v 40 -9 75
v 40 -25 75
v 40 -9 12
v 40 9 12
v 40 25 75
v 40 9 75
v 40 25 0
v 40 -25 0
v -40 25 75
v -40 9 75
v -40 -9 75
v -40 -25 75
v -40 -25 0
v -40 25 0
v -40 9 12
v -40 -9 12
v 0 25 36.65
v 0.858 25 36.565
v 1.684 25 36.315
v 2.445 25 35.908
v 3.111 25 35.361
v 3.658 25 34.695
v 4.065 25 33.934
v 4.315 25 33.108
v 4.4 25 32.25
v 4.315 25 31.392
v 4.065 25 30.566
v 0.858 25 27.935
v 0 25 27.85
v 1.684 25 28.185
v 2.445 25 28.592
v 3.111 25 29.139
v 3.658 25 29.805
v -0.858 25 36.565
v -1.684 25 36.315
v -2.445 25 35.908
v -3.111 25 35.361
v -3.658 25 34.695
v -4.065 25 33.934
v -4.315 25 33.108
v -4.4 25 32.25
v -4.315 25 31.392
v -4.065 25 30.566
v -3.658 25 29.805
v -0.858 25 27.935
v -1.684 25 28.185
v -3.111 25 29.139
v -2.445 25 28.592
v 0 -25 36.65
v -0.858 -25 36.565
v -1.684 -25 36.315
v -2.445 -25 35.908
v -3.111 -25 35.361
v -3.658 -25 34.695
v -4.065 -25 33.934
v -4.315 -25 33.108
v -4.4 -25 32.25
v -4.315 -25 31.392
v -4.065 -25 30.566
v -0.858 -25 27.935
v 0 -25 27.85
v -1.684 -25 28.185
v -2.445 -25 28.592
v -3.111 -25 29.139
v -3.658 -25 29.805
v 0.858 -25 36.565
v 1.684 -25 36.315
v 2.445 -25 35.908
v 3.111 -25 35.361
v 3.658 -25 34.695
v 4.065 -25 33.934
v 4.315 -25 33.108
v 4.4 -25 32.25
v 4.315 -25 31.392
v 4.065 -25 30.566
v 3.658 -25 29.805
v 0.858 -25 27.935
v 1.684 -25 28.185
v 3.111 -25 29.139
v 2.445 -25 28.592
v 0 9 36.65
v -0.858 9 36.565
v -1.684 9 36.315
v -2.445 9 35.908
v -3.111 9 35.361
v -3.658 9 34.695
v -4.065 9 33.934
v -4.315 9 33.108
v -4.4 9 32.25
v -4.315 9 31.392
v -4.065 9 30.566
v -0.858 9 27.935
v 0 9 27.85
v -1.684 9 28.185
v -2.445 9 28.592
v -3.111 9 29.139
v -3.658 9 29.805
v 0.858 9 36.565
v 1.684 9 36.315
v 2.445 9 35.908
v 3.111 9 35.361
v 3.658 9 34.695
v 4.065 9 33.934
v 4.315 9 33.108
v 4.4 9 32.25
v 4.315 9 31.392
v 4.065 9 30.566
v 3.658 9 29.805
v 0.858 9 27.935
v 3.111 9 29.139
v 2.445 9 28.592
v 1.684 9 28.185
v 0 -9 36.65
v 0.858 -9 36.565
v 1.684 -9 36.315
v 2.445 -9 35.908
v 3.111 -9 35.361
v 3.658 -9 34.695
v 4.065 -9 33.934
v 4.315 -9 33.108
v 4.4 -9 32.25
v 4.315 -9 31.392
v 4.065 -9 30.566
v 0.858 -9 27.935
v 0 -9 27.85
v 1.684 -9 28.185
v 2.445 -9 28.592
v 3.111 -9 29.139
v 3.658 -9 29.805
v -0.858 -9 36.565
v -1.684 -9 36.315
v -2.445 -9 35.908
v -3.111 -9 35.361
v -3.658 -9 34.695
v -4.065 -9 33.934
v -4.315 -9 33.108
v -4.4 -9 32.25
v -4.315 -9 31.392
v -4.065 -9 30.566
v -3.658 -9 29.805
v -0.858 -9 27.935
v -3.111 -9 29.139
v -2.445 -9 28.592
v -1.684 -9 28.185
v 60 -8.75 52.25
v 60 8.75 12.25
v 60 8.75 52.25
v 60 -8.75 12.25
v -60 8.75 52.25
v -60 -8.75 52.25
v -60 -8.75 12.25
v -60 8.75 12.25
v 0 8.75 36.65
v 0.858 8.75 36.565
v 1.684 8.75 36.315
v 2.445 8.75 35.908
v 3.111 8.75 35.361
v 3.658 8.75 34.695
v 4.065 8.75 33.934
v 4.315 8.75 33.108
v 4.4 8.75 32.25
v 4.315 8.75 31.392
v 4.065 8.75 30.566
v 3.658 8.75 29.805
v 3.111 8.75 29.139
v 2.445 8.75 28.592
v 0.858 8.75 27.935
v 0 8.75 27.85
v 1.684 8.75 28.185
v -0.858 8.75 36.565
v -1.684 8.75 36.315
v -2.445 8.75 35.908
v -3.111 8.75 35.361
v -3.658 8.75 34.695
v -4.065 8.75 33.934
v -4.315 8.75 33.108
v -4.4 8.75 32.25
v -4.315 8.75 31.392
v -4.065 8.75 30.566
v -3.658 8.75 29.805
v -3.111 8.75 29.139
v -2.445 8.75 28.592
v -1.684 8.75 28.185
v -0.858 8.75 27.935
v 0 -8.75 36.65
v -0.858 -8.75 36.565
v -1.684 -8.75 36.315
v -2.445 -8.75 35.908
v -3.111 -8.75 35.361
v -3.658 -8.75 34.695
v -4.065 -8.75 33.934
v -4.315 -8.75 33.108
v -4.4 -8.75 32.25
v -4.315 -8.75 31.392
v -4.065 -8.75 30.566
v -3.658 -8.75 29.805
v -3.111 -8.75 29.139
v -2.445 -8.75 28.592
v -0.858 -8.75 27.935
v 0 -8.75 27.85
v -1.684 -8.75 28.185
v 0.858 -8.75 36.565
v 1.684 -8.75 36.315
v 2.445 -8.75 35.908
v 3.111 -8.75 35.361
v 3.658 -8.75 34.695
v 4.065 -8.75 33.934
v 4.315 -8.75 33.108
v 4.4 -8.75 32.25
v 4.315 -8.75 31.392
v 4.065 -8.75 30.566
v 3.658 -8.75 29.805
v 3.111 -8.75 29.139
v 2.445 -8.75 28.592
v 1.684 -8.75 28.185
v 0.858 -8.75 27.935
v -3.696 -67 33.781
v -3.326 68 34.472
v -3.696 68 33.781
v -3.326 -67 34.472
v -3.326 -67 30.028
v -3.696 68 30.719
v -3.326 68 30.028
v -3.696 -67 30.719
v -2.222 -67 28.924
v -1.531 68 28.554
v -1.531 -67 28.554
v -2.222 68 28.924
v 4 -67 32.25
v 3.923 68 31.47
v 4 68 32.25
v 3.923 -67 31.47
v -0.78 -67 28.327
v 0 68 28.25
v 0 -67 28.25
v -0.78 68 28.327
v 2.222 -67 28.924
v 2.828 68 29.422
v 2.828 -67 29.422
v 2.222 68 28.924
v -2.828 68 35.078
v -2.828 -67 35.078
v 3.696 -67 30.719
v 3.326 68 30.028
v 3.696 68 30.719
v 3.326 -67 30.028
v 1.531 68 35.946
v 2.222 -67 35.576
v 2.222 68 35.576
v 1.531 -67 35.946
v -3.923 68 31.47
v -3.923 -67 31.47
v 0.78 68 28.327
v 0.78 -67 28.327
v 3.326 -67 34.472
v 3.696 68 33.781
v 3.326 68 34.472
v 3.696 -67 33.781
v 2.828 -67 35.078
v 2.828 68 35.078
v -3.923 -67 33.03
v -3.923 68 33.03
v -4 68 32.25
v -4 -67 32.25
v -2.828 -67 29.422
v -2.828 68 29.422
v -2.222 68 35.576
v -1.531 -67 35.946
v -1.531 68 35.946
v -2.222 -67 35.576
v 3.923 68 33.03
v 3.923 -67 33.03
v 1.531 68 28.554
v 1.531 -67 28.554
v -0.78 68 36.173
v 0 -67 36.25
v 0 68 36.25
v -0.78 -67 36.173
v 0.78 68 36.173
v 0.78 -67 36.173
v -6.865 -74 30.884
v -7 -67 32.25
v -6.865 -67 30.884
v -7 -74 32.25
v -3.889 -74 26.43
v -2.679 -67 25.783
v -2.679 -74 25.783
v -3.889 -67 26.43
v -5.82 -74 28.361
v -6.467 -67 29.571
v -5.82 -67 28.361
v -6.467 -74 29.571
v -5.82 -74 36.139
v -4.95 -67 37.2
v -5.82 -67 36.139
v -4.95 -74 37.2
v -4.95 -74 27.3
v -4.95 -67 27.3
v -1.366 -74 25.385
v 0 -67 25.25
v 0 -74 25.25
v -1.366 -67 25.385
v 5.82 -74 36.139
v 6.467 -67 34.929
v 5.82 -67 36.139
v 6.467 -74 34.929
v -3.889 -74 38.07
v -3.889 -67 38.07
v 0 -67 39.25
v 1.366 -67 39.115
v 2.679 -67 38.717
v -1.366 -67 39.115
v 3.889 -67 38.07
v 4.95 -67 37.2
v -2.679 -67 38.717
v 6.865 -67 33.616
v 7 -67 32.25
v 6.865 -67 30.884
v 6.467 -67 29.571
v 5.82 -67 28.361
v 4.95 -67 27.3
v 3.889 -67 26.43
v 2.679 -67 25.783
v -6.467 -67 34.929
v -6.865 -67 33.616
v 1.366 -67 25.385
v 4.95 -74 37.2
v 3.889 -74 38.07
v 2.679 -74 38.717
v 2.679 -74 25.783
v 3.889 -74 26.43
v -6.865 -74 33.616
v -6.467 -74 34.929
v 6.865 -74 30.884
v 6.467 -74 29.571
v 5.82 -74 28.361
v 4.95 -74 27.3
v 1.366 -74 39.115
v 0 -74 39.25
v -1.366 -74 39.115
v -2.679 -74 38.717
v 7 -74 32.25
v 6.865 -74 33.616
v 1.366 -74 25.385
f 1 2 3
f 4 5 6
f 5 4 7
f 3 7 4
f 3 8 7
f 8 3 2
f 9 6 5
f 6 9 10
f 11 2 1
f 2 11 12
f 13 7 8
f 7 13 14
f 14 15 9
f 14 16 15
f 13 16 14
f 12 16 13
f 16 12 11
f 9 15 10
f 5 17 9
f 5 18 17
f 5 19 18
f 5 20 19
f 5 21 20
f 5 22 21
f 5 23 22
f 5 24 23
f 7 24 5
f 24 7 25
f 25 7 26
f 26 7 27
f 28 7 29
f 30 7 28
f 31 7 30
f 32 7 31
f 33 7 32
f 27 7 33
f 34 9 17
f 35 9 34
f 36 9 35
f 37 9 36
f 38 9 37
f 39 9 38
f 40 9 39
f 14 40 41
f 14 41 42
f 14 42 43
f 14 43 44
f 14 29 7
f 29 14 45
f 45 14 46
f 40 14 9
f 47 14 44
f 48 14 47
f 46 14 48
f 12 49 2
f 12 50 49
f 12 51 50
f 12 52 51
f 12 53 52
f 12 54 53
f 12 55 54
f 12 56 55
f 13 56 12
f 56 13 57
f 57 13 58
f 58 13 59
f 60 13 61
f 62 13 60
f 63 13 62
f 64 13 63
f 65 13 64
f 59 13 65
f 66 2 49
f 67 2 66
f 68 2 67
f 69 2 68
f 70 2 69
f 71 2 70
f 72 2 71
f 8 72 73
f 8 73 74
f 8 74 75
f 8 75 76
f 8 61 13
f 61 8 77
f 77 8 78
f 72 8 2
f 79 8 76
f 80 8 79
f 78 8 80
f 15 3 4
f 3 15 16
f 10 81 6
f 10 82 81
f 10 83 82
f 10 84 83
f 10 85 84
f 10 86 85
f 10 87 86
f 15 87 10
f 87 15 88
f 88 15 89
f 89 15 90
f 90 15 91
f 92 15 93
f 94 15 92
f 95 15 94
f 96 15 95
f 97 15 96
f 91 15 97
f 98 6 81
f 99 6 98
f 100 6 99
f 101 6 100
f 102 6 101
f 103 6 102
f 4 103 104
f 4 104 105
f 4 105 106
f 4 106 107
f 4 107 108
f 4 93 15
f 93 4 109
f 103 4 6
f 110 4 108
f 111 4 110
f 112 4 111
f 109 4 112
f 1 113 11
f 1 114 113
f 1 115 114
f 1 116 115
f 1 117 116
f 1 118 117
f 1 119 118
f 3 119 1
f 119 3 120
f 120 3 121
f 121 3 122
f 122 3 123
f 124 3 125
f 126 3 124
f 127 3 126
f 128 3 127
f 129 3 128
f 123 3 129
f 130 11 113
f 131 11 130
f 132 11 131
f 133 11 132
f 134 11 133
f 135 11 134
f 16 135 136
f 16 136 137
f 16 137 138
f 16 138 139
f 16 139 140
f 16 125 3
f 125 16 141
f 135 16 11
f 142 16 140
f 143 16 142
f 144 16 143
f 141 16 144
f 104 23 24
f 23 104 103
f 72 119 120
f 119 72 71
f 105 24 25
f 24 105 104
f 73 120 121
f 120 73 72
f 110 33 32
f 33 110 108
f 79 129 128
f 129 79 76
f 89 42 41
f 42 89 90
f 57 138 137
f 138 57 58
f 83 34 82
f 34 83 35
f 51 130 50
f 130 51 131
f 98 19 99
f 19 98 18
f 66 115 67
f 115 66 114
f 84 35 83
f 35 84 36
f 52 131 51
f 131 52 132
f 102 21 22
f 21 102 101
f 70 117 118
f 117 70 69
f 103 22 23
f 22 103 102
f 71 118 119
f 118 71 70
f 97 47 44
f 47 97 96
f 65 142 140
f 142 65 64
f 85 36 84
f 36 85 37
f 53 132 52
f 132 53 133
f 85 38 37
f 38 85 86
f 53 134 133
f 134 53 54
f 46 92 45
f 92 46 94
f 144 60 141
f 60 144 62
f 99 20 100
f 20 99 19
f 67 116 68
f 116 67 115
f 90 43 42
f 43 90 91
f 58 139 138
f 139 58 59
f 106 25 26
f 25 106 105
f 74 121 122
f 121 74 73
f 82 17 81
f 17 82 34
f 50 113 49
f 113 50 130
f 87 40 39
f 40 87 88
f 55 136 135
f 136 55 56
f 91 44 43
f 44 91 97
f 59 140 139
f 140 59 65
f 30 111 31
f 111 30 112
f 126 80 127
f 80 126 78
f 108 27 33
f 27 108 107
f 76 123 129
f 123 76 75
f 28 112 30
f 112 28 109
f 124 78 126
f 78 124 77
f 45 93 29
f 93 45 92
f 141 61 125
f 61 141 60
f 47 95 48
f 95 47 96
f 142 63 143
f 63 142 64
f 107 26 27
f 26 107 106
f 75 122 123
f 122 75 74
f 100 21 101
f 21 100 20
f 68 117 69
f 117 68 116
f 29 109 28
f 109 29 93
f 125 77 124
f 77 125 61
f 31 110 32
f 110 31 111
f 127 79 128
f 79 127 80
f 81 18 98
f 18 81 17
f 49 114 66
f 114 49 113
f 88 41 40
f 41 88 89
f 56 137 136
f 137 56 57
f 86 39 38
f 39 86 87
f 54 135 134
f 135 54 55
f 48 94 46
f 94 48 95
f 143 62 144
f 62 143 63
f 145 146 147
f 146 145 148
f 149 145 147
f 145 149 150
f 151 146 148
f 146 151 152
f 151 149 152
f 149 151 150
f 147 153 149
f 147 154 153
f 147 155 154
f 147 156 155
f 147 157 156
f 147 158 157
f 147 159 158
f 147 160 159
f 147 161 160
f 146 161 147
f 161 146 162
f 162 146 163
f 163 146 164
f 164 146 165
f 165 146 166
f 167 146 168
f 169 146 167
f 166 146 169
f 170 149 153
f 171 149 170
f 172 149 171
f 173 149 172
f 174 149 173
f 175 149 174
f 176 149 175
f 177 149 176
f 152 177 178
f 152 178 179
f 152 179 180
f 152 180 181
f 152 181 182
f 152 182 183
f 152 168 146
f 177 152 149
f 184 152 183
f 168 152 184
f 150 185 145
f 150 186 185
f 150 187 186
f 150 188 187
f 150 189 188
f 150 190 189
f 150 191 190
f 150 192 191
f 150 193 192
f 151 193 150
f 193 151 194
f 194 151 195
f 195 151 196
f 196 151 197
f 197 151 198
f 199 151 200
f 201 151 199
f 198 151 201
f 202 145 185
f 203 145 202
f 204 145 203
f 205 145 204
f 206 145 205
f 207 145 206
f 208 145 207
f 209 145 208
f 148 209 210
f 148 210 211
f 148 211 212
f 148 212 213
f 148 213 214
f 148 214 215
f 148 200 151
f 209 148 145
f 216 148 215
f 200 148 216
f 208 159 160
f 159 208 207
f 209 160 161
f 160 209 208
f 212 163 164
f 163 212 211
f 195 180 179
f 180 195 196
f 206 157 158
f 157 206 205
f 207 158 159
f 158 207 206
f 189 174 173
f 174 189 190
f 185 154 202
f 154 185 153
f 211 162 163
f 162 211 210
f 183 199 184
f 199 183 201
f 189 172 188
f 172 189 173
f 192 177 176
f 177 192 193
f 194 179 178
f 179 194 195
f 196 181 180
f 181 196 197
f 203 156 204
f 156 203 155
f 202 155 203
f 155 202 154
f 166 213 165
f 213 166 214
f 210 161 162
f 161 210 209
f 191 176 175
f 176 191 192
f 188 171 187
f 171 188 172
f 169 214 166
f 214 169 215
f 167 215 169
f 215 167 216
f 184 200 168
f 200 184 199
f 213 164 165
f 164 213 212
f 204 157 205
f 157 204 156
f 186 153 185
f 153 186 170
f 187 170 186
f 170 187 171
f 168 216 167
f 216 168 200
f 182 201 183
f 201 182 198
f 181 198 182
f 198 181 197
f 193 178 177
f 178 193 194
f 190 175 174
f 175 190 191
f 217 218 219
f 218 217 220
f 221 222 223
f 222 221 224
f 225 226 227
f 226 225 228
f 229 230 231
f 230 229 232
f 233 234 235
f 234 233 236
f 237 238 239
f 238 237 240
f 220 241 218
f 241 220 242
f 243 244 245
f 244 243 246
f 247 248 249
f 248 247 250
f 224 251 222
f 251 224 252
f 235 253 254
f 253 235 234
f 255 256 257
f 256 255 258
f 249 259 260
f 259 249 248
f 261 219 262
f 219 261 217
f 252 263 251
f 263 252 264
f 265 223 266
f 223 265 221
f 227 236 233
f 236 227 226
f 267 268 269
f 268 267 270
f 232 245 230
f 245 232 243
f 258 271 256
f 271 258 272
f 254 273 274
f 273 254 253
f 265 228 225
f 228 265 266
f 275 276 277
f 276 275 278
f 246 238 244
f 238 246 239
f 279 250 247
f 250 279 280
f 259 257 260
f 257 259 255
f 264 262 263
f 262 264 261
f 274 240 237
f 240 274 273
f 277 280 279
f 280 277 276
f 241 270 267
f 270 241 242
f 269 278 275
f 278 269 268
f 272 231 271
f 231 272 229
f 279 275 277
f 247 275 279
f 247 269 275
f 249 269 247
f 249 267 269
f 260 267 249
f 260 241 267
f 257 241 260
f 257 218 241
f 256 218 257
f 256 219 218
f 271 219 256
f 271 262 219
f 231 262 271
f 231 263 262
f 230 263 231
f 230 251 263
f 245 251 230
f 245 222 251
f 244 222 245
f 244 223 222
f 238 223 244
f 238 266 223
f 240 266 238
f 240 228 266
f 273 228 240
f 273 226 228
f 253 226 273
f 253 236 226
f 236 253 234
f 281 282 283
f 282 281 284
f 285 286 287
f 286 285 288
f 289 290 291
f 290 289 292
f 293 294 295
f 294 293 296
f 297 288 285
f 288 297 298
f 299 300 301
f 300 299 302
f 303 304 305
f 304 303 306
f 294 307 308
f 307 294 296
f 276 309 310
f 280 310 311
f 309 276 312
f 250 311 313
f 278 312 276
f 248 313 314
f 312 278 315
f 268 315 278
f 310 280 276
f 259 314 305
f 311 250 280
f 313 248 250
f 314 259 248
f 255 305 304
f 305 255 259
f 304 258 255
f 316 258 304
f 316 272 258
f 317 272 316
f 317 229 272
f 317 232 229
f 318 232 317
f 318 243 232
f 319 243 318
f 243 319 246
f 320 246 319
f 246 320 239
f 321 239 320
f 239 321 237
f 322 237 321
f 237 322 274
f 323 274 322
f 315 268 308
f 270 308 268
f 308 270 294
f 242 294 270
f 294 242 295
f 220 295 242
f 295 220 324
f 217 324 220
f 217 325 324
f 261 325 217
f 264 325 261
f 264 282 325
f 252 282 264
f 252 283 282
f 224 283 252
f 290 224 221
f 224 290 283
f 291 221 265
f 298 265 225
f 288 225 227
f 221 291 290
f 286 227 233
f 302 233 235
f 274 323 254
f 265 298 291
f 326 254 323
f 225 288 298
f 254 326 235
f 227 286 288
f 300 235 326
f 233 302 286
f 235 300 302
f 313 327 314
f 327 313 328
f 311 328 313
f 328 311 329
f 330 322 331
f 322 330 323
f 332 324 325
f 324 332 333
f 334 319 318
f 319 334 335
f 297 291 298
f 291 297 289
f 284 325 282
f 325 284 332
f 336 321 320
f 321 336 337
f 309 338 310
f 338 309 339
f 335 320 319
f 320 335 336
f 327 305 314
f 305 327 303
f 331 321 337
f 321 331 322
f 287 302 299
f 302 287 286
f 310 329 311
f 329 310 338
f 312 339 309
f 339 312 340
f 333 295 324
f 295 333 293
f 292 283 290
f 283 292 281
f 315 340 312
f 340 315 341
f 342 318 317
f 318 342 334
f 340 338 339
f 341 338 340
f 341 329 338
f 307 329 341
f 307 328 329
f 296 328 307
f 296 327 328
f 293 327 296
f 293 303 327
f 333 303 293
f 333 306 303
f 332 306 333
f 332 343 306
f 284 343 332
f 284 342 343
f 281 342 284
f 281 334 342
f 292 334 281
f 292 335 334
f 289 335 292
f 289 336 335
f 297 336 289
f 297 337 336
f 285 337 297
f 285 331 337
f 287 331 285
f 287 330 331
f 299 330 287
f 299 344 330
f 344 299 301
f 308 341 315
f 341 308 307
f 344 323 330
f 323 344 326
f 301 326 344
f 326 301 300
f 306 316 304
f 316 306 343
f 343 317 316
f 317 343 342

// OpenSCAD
$fn = 32;

// ------------------------------------------------------------------------
// Clevis joint: 80 mm clevis, pin d8
// Every part is its own module, assembly() places them once.
// ------------------------------------------------------------------------

// --- part 1 ---
module clevis() {
  difference() {
    translate([-40, -25, 0]) cube([80, 50, 75]);
    translate([-41, -9, 12]) cube([82, 18, 64]);
    translate([0, 0, 32.25]) rotate([90, 0, 0]) cylinder(h = 52, d = 8.8, center = true);
  }
}

// --- part 2 ---
module eye() {
  difference() {
    translate([-60, -8.75, 0]) cube([120, 17.5, 40]);
    translate([0, 0, 20]) rotate([90, 0, 0]) cylinder(h = 19.5, d = 8.8, center = true);
  }
}

// --- part 3 ---
module pin() {
  rotate([0, 90, 0]) cylinder(h = 136, d = 8, center = true);
  translate([-74, 0, 0]) rotate([0, 90, 0]) cylinder(h = 7, d = 14);
}

// --- assembly ---
module assembly() {
  translate([0, 0, 0]) rotate([0, 0, 0]) clevis();
  translate([0, 0, 12.25]) rotate([0, 0, 0]) eye();
  translate([0, 0, 32.25]) rotate([0, 0, 90]) pin();
}

assembly();
